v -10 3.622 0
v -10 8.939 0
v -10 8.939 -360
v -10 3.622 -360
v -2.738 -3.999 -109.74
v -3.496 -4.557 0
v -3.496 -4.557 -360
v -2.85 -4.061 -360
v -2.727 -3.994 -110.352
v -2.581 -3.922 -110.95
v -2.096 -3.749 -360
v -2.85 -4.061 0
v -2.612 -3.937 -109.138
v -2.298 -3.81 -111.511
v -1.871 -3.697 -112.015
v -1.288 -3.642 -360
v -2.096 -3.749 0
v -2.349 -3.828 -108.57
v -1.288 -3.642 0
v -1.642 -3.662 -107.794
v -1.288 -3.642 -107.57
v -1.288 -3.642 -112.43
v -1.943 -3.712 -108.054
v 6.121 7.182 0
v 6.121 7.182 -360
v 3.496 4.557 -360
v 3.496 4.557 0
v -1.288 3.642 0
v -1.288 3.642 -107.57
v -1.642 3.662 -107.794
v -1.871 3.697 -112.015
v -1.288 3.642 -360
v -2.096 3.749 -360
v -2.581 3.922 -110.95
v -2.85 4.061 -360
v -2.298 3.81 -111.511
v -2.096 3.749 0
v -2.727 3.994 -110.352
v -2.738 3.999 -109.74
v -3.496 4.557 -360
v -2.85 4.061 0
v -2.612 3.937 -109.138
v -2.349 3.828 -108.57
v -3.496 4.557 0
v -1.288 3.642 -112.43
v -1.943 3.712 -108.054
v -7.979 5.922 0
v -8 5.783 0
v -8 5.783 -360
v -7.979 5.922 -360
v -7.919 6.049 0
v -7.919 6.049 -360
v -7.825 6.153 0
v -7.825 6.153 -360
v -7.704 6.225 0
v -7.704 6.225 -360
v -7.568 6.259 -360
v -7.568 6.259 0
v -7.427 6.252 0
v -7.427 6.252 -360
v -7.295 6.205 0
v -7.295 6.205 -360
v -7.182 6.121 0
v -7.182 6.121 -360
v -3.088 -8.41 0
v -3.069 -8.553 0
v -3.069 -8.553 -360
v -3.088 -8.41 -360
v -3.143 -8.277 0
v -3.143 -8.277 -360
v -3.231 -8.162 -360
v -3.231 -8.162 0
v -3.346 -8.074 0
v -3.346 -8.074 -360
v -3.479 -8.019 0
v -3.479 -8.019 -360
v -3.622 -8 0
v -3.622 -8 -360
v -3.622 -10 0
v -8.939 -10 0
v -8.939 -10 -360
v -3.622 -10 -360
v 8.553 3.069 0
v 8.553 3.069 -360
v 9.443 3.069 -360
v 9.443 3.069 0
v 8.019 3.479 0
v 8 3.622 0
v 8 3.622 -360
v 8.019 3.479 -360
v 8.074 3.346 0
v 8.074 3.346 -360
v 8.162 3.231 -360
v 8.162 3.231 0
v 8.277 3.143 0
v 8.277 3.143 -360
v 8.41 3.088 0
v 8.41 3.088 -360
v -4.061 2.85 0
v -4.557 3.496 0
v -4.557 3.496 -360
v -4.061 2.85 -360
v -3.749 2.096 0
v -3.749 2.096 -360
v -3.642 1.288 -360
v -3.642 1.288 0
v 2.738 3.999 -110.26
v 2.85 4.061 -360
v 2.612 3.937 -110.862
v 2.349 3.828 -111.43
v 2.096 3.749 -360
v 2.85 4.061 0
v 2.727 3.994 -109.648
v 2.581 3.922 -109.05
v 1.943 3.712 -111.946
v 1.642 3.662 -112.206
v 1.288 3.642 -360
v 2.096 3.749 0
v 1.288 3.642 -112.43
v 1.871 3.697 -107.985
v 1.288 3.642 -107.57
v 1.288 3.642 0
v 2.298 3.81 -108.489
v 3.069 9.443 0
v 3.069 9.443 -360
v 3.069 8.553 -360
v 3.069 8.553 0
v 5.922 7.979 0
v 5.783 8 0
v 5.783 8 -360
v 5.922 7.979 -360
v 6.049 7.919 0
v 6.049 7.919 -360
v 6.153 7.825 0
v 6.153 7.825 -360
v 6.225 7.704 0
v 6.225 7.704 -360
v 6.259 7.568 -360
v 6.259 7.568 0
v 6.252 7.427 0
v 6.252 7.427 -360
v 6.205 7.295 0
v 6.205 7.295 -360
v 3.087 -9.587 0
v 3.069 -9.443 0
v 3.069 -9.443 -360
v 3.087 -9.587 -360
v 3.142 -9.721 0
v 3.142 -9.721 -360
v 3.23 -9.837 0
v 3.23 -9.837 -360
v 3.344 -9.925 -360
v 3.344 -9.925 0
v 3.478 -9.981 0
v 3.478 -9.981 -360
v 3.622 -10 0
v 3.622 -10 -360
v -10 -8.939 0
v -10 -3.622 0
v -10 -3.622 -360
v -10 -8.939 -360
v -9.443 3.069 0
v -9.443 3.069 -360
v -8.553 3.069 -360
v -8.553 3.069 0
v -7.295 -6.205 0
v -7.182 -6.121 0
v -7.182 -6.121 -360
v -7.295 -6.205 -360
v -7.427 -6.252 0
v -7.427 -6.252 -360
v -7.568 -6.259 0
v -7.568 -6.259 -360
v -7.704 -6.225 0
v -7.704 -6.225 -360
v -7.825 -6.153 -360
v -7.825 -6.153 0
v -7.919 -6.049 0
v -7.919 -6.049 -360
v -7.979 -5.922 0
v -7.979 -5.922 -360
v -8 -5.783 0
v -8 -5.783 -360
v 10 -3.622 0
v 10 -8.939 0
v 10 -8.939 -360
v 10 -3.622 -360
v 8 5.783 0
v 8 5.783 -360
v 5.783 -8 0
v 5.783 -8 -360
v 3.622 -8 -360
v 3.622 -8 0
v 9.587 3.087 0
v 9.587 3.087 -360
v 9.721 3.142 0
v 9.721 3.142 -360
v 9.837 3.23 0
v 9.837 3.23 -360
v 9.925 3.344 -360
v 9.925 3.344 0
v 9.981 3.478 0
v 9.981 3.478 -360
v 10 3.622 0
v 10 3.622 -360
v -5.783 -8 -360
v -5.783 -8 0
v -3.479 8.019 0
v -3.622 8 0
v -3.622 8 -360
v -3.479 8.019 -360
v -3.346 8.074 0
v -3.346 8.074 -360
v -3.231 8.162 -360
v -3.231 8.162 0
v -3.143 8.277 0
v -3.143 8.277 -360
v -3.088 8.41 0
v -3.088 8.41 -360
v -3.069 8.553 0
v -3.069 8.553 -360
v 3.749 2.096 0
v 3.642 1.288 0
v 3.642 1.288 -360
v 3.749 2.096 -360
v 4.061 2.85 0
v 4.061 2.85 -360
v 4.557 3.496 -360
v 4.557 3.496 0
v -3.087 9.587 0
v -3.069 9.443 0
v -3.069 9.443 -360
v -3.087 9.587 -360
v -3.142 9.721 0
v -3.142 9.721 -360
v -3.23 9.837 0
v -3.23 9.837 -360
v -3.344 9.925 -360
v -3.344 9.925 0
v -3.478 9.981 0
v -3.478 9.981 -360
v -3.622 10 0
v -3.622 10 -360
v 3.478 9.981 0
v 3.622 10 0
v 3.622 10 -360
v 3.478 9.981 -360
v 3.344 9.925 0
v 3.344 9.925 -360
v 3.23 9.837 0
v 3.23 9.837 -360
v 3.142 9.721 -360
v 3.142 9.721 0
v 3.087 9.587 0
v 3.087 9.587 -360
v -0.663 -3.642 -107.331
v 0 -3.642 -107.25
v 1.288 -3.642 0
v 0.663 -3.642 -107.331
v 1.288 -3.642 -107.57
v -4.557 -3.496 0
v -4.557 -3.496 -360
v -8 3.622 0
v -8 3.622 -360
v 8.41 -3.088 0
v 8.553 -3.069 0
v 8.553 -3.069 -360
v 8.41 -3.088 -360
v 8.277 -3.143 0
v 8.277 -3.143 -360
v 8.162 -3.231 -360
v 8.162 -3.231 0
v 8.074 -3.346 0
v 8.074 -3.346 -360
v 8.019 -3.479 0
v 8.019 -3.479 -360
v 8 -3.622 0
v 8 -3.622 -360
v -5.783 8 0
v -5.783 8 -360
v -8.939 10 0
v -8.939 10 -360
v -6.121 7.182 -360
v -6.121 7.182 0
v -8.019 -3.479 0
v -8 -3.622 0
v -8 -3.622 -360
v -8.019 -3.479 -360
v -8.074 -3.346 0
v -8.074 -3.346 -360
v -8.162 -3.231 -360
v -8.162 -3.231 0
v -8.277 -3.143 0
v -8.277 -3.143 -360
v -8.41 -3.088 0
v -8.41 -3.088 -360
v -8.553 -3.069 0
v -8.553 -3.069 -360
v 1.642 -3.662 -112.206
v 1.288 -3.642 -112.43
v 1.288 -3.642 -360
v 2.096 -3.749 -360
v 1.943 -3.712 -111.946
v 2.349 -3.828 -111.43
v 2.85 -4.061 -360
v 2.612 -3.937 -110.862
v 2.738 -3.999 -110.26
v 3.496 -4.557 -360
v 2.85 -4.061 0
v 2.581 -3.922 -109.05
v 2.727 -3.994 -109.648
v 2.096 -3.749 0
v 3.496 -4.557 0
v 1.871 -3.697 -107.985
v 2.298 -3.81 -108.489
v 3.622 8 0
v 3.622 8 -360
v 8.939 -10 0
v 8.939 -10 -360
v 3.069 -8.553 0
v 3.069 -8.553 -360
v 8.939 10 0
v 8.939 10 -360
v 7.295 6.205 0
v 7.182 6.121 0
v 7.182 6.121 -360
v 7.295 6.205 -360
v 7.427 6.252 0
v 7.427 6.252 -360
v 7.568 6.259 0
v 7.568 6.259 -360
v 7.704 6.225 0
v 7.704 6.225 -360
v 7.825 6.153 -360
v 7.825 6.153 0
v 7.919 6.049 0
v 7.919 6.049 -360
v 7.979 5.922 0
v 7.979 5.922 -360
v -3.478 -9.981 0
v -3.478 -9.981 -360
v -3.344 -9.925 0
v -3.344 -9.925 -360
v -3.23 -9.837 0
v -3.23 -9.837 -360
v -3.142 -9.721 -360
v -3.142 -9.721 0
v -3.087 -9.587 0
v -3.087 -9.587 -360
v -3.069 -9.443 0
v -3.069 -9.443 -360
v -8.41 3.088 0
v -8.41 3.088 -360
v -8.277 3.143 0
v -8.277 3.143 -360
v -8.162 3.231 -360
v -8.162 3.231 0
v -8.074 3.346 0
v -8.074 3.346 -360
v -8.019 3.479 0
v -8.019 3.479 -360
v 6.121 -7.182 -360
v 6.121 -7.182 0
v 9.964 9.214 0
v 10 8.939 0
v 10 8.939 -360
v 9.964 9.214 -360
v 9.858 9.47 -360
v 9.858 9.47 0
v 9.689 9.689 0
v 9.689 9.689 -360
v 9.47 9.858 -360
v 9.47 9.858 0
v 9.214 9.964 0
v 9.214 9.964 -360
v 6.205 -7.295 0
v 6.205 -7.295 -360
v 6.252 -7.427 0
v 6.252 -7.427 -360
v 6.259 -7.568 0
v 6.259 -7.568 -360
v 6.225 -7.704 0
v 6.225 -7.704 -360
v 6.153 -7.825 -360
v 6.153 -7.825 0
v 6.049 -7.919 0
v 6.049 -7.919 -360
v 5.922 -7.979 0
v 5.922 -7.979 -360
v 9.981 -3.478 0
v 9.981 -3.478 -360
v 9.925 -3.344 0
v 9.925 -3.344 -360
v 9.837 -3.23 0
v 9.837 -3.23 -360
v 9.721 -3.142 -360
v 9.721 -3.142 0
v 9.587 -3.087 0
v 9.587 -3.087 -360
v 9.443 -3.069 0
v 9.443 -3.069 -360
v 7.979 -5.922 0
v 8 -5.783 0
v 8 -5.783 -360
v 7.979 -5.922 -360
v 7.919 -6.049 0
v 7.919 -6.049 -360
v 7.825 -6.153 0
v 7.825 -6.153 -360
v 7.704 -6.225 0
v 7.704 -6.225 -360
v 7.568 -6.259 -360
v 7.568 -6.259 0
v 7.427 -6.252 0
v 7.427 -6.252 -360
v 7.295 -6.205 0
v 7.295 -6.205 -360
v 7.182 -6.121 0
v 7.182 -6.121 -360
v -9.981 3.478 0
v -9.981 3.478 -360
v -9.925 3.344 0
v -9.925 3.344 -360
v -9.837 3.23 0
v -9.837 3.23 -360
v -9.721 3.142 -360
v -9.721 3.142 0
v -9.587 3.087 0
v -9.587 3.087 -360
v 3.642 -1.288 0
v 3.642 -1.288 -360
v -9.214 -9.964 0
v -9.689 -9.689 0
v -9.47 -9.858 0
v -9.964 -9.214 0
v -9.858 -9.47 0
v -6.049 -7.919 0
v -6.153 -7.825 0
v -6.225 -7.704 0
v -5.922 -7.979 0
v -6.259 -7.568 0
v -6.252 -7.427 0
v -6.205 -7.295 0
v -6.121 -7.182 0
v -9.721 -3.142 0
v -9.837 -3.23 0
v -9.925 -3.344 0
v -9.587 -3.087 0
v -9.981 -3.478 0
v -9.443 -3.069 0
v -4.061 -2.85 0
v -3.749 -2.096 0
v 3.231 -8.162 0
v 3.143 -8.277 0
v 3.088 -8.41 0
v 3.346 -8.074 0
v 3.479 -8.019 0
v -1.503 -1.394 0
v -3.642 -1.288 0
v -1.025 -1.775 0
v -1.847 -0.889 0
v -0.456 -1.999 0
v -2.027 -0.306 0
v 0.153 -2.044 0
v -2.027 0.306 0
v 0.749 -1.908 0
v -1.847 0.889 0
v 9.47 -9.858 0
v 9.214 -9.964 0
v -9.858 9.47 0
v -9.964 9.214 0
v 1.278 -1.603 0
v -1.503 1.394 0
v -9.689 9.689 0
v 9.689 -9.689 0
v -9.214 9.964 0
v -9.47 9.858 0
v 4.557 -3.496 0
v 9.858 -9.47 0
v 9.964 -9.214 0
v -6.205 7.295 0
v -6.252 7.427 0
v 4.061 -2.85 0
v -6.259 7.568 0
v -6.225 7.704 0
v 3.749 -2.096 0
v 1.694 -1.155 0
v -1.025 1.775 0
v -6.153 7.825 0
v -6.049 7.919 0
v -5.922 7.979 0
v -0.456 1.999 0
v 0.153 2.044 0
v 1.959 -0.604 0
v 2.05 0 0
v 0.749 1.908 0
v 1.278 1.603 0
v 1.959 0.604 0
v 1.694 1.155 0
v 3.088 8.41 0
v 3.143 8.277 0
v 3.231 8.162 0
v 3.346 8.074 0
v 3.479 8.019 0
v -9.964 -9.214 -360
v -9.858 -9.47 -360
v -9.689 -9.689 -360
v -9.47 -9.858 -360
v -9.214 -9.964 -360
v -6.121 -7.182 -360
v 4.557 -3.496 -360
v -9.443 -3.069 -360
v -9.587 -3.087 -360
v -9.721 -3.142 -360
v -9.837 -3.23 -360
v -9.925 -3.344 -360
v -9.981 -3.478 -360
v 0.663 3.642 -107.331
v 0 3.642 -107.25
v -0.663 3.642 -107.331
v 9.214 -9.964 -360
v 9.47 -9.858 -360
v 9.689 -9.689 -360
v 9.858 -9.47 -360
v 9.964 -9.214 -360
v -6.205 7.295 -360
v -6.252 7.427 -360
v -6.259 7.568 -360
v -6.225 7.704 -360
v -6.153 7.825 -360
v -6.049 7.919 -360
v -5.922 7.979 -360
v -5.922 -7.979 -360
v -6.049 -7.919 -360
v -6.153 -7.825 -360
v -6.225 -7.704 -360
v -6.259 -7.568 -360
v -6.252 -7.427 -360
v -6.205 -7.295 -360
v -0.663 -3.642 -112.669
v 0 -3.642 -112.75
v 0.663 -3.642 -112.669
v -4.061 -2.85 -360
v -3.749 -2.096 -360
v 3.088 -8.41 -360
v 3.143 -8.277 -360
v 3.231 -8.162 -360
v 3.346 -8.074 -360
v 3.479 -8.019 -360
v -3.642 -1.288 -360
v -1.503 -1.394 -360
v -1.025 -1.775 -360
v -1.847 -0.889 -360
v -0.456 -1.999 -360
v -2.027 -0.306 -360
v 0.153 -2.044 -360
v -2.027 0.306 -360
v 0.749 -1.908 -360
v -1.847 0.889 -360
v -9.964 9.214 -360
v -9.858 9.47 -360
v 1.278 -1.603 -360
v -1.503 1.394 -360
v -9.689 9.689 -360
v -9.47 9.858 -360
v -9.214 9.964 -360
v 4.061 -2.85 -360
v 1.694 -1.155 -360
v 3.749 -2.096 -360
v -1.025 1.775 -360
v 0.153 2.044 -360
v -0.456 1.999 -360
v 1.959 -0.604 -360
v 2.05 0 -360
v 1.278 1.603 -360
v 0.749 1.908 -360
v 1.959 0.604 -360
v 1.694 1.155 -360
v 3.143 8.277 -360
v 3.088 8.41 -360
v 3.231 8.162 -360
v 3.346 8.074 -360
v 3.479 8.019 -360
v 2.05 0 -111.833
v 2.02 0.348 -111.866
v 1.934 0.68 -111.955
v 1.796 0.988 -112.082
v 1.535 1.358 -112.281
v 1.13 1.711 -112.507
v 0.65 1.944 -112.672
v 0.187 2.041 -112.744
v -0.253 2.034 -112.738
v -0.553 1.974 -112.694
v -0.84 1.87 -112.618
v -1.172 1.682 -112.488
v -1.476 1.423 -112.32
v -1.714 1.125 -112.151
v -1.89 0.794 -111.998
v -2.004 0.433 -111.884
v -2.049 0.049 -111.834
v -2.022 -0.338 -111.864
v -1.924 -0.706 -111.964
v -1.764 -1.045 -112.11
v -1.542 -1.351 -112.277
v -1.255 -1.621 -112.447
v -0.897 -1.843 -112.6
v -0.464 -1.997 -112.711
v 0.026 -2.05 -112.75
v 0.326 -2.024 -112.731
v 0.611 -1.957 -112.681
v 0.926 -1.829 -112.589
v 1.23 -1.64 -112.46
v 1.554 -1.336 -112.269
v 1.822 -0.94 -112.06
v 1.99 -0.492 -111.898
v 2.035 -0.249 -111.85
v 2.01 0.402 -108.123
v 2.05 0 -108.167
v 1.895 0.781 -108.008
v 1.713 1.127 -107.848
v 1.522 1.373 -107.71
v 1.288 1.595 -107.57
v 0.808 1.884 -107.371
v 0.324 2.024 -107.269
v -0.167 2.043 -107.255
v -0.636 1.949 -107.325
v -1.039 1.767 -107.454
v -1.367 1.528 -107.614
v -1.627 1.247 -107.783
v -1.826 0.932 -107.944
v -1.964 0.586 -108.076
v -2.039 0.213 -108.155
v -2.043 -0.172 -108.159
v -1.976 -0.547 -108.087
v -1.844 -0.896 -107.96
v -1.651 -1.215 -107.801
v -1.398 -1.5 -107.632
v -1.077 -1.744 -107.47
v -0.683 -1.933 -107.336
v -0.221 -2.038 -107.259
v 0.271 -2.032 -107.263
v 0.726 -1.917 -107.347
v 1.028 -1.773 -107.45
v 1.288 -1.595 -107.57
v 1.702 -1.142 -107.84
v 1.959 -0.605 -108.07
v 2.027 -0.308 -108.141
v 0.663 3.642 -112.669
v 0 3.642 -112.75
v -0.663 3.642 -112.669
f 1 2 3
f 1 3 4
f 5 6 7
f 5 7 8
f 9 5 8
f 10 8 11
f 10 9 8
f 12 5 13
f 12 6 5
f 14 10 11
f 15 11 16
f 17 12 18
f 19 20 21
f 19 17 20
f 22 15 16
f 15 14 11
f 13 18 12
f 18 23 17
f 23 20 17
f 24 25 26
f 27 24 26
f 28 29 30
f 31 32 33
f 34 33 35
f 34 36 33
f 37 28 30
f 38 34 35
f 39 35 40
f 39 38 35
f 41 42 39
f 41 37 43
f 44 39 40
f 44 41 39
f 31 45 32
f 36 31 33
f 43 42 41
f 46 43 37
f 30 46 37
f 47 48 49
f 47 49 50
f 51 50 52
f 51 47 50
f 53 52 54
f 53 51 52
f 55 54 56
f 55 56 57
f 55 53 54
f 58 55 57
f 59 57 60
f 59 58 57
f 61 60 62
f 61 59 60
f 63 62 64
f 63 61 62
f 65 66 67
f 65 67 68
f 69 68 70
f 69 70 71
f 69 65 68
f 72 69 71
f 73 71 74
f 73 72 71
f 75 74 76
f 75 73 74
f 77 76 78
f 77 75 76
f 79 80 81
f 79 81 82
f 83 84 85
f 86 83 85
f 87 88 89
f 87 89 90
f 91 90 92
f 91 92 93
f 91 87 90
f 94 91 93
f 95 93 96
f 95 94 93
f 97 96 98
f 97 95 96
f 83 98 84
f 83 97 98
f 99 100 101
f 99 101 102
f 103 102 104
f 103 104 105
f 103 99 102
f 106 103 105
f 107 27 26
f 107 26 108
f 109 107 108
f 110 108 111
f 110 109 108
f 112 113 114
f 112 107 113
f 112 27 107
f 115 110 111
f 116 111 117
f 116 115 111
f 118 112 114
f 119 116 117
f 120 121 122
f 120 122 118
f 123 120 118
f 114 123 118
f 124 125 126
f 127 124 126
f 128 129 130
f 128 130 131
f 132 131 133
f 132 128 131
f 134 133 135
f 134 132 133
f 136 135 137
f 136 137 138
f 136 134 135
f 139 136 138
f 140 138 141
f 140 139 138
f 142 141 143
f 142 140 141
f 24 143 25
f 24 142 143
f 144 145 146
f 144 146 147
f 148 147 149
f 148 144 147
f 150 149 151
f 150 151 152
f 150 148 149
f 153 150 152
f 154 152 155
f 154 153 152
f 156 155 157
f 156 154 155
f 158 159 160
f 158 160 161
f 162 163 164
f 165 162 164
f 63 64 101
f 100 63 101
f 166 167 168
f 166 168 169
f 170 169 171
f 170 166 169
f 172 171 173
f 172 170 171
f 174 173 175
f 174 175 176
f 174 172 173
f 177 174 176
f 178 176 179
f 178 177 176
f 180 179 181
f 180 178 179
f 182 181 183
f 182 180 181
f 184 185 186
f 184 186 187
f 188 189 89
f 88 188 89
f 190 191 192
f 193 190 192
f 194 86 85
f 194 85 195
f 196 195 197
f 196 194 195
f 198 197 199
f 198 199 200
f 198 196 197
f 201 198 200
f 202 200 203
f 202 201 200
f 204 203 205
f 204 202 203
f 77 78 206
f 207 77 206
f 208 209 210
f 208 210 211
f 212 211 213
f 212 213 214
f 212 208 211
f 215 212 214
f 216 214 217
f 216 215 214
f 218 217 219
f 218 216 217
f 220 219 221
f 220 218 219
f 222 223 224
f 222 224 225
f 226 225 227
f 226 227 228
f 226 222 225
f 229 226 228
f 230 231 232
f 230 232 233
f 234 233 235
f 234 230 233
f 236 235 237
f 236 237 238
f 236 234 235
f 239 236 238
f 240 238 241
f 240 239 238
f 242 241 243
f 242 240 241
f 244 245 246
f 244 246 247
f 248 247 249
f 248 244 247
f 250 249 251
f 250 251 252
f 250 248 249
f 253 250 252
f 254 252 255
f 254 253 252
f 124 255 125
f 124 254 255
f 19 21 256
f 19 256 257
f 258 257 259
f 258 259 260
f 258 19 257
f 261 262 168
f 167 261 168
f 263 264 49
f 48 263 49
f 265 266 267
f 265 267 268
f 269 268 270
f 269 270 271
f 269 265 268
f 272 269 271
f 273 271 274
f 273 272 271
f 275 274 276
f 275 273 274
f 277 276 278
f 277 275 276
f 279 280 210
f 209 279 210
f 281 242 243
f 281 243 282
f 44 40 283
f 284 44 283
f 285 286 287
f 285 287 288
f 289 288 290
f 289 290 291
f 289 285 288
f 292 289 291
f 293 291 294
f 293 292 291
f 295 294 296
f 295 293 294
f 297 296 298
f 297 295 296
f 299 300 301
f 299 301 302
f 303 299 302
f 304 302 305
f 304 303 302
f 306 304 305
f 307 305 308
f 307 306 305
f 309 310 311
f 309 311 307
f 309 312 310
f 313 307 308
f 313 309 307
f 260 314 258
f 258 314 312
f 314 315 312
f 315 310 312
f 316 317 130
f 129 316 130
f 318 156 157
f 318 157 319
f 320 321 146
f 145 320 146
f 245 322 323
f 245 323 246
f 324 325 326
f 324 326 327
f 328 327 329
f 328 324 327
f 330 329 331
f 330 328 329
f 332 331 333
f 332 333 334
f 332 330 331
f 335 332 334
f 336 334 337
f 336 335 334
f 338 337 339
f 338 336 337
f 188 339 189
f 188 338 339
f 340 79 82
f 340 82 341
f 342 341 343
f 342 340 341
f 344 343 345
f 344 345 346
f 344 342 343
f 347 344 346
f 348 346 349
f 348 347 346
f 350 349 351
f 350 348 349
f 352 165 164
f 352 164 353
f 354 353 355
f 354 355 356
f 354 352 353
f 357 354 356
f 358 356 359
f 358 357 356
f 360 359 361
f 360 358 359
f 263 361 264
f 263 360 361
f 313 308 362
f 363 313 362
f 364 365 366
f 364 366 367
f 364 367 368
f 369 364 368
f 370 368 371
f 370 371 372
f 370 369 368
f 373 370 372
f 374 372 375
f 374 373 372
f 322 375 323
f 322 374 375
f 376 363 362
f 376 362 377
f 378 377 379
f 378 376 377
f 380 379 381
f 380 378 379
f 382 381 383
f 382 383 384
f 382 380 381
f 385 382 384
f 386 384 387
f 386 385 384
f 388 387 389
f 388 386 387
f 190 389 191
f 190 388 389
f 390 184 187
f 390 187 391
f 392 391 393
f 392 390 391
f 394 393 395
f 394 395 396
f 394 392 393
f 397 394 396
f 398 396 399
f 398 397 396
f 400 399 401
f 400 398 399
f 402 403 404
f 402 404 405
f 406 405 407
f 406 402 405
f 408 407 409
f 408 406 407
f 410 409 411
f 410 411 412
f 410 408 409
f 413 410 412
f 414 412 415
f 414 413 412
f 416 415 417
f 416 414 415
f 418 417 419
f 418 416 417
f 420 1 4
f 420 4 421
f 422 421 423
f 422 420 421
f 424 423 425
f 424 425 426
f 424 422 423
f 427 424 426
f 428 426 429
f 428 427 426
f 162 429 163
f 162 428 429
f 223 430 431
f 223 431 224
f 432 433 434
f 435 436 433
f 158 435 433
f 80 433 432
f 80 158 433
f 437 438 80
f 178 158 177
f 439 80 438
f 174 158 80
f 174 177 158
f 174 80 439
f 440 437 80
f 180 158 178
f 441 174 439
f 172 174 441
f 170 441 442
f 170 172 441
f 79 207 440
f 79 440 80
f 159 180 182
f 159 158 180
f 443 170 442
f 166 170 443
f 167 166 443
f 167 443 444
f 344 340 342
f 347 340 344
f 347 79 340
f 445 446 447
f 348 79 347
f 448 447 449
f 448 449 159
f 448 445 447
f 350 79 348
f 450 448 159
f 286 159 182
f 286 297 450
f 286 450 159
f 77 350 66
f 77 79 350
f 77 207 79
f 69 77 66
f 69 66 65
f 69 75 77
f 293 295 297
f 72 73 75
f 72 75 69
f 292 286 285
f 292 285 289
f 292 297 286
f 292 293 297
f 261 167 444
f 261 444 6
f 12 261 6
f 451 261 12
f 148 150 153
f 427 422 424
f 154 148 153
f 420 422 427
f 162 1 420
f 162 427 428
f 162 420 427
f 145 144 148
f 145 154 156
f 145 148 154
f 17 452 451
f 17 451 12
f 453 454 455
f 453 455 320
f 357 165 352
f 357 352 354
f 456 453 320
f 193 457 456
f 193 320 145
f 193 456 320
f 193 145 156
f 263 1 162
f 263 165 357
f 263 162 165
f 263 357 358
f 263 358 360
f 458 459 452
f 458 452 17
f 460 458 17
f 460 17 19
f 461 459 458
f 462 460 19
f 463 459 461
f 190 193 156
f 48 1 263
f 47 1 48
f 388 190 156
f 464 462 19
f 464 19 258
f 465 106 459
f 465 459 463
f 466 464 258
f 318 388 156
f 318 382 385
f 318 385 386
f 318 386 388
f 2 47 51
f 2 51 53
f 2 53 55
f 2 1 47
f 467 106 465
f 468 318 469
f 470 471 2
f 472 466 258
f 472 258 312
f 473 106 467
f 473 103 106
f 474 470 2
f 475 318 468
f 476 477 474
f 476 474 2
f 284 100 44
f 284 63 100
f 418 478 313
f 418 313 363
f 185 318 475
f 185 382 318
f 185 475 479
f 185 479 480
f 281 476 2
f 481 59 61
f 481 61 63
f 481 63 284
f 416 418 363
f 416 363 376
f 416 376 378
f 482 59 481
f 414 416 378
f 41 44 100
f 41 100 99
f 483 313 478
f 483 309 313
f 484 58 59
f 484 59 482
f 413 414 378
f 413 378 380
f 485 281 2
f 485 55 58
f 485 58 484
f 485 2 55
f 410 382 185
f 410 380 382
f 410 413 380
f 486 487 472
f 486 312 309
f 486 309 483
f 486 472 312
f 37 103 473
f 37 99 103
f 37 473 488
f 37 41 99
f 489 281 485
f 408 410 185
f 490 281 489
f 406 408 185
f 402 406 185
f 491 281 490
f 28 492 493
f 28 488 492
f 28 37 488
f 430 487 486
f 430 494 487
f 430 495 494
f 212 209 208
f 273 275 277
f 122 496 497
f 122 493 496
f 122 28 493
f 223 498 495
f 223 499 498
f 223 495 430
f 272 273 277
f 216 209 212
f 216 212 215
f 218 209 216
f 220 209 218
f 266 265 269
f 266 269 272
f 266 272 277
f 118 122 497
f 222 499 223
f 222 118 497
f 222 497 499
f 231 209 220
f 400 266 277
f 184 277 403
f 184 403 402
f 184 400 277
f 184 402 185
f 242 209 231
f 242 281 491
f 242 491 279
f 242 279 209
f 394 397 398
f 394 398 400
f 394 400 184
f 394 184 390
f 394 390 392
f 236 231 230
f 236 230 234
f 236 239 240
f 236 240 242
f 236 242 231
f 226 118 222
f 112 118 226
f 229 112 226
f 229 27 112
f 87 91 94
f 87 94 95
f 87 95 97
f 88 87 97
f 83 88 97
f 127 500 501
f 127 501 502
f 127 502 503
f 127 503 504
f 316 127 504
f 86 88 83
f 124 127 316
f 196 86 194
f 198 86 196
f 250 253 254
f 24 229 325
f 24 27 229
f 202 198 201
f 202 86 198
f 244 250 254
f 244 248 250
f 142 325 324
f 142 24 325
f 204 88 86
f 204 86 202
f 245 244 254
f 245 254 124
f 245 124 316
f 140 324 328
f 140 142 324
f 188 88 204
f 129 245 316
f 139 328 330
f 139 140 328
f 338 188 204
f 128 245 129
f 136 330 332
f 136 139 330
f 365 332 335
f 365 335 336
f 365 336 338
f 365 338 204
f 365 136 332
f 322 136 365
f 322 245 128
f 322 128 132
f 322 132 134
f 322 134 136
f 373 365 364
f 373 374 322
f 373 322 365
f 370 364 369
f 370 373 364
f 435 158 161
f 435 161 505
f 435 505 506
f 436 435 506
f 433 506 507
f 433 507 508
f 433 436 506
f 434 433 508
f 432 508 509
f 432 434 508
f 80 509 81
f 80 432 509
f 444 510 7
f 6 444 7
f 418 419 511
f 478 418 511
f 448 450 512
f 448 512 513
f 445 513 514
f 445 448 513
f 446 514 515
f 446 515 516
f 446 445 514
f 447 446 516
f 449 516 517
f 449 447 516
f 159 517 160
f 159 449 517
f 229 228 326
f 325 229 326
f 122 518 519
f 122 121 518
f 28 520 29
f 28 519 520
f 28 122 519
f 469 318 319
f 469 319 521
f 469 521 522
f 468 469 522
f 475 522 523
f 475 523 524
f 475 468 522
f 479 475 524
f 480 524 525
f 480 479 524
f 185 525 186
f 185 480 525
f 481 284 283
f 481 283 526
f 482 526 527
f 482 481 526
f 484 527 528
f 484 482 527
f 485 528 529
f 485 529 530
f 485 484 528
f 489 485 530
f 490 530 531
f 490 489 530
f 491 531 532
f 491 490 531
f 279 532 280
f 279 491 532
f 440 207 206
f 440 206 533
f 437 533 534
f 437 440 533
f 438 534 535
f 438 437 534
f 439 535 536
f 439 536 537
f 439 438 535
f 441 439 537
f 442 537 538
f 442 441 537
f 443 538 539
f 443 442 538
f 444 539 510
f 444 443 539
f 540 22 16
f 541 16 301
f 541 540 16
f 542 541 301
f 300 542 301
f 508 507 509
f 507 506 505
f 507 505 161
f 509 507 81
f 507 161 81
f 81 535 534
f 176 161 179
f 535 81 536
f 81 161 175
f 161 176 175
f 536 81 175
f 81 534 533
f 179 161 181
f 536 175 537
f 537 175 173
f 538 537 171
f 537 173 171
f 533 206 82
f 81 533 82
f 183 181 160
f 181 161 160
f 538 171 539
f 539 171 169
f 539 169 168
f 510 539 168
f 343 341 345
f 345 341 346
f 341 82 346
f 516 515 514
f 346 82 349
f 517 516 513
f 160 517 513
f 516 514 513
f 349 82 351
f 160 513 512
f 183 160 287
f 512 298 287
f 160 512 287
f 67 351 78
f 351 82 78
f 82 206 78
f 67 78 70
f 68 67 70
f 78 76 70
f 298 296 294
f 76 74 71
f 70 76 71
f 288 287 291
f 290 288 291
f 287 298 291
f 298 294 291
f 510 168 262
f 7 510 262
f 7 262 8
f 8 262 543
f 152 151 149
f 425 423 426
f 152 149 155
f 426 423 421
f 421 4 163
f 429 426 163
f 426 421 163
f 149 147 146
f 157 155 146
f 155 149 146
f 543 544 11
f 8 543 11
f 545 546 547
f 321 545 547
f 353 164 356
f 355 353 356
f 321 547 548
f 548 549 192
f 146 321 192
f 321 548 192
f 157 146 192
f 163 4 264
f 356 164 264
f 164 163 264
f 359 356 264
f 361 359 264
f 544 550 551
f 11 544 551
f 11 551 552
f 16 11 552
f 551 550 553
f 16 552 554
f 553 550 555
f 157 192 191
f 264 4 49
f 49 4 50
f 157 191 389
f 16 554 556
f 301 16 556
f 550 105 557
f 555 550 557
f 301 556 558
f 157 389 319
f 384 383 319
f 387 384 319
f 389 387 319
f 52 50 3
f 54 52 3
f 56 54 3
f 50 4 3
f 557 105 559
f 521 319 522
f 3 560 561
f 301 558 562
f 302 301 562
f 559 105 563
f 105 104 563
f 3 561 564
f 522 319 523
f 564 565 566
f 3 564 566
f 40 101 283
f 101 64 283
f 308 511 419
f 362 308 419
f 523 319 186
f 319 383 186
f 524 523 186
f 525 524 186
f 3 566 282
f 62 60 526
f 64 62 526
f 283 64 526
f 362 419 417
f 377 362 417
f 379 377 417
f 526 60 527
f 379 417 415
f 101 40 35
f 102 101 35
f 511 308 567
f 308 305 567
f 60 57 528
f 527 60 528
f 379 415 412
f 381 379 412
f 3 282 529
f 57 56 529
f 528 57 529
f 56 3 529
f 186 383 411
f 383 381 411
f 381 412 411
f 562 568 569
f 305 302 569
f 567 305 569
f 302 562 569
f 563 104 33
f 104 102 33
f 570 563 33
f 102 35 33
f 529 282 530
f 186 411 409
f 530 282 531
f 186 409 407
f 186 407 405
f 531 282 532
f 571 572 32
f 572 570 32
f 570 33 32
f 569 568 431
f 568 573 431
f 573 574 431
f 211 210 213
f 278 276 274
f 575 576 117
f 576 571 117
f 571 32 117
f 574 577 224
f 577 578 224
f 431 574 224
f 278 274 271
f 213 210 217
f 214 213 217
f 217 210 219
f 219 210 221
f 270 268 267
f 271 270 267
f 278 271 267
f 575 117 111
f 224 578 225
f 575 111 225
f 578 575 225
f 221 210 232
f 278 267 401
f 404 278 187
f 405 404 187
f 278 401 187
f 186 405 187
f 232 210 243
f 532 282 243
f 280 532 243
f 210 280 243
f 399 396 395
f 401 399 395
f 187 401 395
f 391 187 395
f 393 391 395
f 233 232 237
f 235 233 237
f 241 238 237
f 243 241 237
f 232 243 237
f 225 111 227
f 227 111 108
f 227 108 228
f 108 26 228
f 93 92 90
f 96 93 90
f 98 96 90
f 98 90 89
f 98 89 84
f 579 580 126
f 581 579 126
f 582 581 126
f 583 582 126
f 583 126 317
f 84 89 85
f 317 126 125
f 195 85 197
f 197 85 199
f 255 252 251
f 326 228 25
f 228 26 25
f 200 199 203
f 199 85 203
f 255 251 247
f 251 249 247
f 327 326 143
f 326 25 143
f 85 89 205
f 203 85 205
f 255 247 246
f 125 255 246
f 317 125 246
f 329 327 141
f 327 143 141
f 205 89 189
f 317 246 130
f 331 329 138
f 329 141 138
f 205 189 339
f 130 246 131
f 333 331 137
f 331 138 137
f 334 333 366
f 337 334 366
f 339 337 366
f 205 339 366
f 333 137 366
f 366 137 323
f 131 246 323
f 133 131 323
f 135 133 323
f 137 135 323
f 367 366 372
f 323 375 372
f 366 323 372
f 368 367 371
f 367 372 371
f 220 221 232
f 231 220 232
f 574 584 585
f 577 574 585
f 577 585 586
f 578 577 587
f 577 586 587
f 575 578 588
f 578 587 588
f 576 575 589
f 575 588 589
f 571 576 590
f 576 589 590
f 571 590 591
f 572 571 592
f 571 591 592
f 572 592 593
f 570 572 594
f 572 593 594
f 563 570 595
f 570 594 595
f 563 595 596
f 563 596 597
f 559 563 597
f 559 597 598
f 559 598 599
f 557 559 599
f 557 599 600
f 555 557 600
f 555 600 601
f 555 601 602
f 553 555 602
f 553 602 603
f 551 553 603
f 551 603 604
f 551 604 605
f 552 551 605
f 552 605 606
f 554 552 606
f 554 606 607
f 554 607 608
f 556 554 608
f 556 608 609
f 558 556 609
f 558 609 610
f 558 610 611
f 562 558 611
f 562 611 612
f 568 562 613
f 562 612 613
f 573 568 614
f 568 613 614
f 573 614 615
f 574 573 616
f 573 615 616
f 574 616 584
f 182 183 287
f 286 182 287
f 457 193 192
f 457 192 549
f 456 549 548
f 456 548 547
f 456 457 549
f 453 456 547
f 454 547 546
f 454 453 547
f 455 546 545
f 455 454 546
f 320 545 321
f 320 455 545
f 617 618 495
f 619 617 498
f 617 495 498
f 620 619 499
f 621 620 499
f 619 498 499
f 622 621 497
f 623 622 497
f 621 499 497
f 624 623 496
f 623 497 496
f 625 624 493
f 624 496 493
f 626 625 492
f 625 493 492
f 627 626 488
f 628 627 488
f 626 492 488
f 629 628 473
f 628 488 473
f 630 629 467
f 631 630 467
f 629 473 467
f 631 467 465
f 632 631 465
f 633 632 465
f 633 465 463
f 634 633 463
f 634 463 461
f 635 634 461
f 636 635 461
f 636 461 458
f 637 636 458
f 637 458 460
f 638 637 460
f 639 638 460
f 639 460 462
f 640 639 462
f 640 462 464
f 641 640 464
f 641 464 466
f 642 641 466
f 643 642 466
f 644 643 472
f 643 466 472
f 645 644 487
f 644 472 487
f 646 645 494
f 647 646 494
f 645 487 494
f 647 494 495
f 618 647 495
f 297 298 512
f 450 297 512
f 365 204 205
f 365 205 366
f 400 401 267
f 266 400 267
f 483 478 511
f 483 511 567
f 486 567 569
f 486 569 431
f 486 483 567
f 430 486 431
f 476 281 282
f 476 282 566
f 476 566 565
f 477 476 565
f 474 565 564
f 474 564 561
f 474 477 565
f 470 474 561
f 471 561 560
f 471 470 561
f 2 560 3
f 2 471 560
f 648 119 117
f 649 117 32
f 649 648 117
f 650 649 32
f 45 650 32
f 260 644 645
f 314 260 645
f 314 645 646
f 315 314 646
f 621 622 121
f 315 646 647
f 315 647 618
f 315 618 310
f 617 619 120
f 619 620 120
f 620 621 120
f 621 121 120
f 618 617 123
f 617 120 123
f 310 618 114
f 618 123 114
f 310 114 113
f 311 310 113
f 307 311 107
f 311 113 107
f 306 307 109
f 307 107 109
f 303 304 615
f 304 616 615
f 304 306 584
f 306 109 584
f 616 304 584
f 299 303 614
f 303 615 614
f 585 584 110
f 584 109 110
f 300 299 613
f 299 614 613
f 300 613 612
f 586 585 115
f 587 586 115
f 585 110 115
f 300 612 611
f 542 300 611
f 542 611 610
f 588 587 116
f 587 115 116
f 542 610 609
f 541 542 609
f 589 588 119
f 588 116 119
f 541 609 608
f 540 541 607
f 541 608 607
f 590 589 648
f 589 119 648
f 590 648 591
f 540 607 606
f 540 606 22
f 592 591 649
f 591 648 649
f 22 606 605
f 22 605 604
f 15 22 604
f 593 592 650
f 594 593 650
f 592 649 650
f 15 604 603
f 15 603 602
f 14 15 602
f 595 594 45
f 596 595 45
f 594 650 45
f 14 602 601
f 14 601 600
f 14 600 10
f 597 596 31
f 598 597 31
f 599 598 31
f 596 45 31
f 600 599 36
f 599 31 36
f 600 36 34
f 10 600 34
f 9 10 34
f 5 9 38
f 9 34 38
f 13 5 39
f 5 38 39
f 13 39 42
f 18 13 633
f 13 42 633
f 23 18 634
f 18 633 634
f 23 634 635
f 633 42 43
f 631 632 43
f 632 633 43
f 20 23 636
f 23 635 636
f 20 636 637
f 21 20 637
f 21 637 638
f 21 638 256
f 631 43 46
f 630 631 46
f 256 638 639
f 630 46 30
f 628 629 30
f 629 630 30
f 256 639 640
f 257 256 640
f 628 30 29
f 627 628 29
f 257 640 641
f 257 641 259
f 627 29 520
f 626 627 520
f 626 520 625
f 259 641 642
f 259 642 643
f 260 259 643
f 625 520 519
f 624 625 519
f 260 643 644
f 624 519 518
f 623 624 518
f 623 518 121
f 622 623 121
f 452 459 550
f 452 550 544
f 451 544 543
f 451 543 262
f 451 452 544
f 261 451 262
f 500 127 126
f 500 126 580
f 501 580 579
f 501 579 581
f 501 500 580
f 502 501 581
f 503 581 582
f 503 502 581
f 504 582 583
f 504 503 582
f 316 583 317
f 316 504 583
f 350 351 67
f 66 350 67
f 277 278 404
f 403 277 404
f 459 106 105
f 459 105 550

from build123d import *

# Parameters (mm, degrees)
SKETCH2_R           = 2.05
BOSS_EXTRUDE1_DEPTH = 360
SKETCH3_R           = 2.75
CUT_EXTRUDE1_DEPTH  = 34


with BuildPart() as part:
    # Sketch2 → Boss-Extrude1 (new body)
    with BuildSketch(Plane.XY):
        with BuildLine():
            Line((-3.642230561, 1.287773026), (-3.642230561, -1.287773026))
            ThreePointArc((-3.642230561, -1.287773026), (-3.87999308, -2.483085929), (-4.55708345, -3.496423279))
            Line((-4.55708345, -3.496423279), (-7.182004606, -6.121344434))
            ThreePointArc((-7.182004606, -6.121344434), (-7.704200045, -6.225215565), (-8, -5.782519648))
            Line((-8, -5.782519648), (-8, -3.622007668))
            ThreePointArc((-8, -3.622007668), (-8.161974206, -3.230967343), (-8.553014531, -3.068993137))
            Line((-8.553014531, -3.068993137), (-9.443284204, -3.068993137))
            ThreePointArc((-9.443284204, -3.068993137), (-9.836715763, -3.229656566), (-10, -3.622007668))
            Line((-10, -3.622007668), (-10, -8.939033256))
            ThreePointArc((-10, -8.939033256), (-9.689250035, -9.689250035), (-8.939033256, -10))
            Line((-8.939033256, -10), (-3.622007668, -10))
            ThreePointArc((-3.622007668, -10), (-3.229656566, -9.836715763), (-3.068993137, -9.443284204))
            Line((-3.068993137, -9.443284204), (-3.068993137, -8.553014531))
            ThreePointArc((-3.068993137, -8.553014531), (-3.230967343, -8.161974206), (-3.622007668, -8))
            Line((-3.622007668, -8), (-5.782519648, -8))
            ThreePointArc((-5.782519648, -8), (-6.225215565, -7.704200045), (-6.121344434, -7.182004606))
            Line((-6.121344434, -7.182004606), (-3.496423279, -4.55708345))
            ThreePointArc((-3.496423279, -4.55708345), (-2.483085929, -3.87999308), (-1.287773026, -3.642230561))
            Line((-1.287773026, -3.642230561), (1.287773026, -3.642230561))
            ThreePointArc((1.287773026, -3.642230561), (2.483085929, -3.87999308), (3.496423279, -4.55708345))
            Line((3.496423279, -4.55708345), (6.121344434, -7.182004606))
            ThreePointArc((6.121344434, -7.182004606), (6.225215565, -7.704200045), (5.782519648, -8))
            Line((5.782519648, -8), (3.622007668, -8))
            ThreePointArc((3.622007668, -8), (3.230967343, -8.161974206), (3.068993137, -8.553014531))
            Line((3.068993137, -8.553014531), (3.068993137, -9.443284204))
            ThreePointArc((3.068993137, -9.443284204), (3.229656566, -9.836715763), (3.622007668, -10))
            Line((3.622007668, -10), (8.939033256, -10))
            ThreePointArc((8.939033256, -10), (9.689250035, -9.689250035), (10, -8.939033256))
            Line((10, -8.939033256), (10, -3.622007668))
            ThreePointArc((10, -3.622007668), (9.836715763, -3.229656566), (9.443284204, -3.068993137))
            Line((9.443284204, -3.068993137), (8.553014531, -3.068993137))
            ThreePointArc((8.553014531, -3.068993137), (8.161974206, -3.230967343), (8, -3.622007668))
            Line((8, -3.622007668), (8, -5.782519648))
            ThreePointArc((8, -5.782519648), (7.704200045, -6.225215565), (7.182004606, -6.121344434))
            Line((7.182004606, -6.121344434), (4.55708345, -3.496423279))
            ThreePointArc((4.55708345, -3.496423279), (3.87999308, -2.483085929), (3.642230561, -1.287773026))
            Line((3.642230561, -1.287773026), (3.642230561, 1.287773026))
            ThreePointArc((3.642230561, 1.287773026), (3.87999308, 2.483085929), (4.55708345, 3.496423279))
            Line((4.55708345, 3.496423279), (7.182004606, 6.121344434))
            ThreePointArc((7.182004606, 6.121344434), (7.704200045, 6.225215565), (8, 5.782519648))
            Line((8, 5.782519648), (8, 3.622007668))
            ThreePointArc((8, 3.622007668), (8.161974206, 3.230967343), (8.553014531, 3.068993137))
            Line((8.553014531, 3.068993137), (9.443284204, 3.068993137))
            ThreePointArc((9.443284204, 3.068993137), (9.836715763, 3.229656566), (10, 3.622007668))
            Line((10, 3.622007668), (10, 8.939033256))
            ThreePointArc((10, 8.939033256), (9.689250035, 9.689250035), (8.939033256, 10))
            Line((8.939033256, 10), (3.622007668, 10))
            ThreePointArc((3.622007668, 10), (3.229656566, 9.836715763), (3.068993137, 9.443284204))
            Line((3.068993137, 9.443284204), (3.068993137, 8.553014531))
            ThreePointArc((3.068993137, 8.553014531), (3.230967343, 8.161974206), (3.622007668, 8))
            Line((3.622007668, 8), (5.782519648, 8))
            ThreePointArc((5.782519648, 8), (6.225215565, 7.704200045), (6.121344434, 7.182004606))
            Line((6.121344434, 7.182004606), (3.496423279, 4.55708345))
            ThreePointArc((3.496423279, 4.55708345), (2.483085929, 3.87999308), (1.287773026, 3.642230561))
            Line((1.287773026, 3.642230561), (-1.287773026, 3.642230561))
            ThreePointArc((-1.287773026, 3.642230561), (-2.483085929, 3.87999308), (-3.496423279, 4.55708345))
            Line((-3.496423279, 4.55708345), (-6.121344434, 7.182004606))
            ThreePointArc((-6.121344434, 7.182004606), (-6.225215565, 7.704200045), (-5.782519648, 8))
            Line((-5.782519648, 8), (-3.622007668, 8))
            ThreePointArc((-3.622007668, 8), (-3.230967343, 8.161974206), (-3.068993137, 8.553014531))
            Line((-3.068993137, 8.553014531), (-3.068993137, 9.443284204))
            ThreePointArc((-3.068993137, 9.443284204), (-3.229656566, 9.836715763), (-3.622007668, 10))
            Line((-3.622007668, 10), (-8.939033256, 10))
            ThreePointArc((-8.939033256, 10), (-9.689250035, 9.689250035), (-10, 8.939033256))
            Line((-10, 8.939033256), (-10, 3.622007668))
            ThreePointArc((-10, 3.622007668), (-9.836715763, 3.229656566), (-9.443284204, 3.068993137))
            Line((-9.443284204, 3.068993137), (-8.553014531, 3.068993137))
            ThreePointArc((-8.553014531, 3.068993137), (-8.161974206, 3.230967343), (-8, 3.622007668))
            Line((-8, 3.622007668), (-8, 5.782519648))
            ThreePointArc((-8, 5.782519648), (-7.704200045, 6.225215565), (-7.182004606, 6.121344434))
            Line((-7.182004606, 6.121344434), (-4.55708345, 3.496423279))
            ThreePointArc((-4.55708345, 3.496423279), (-3.87999308, 2.483085929), (-3.642230561, 1.287773026))
        make_face()
        Circle(SKETCH2_R, mode=Mode.SUBTRACT)
    extrude(amount=-BOSS_EXTRUDE1_DEPTH)

    # Sketch3 → Cut-Extrude1 (cut)
    with BuildSketch(Plane(origin=(0, 10, 0), x_dir=(1, 0, 0), z_dir=(0, 1, 0))):
        with Locations(Location((0, 110, 0), (0, 0, 297.922776764))):
            Circle(SKETCH3_R)
    extrude(amount=-CUT_EXTRUDE1_DEPTH, mode=Mode.SUBTRACT)


solid = part.part
